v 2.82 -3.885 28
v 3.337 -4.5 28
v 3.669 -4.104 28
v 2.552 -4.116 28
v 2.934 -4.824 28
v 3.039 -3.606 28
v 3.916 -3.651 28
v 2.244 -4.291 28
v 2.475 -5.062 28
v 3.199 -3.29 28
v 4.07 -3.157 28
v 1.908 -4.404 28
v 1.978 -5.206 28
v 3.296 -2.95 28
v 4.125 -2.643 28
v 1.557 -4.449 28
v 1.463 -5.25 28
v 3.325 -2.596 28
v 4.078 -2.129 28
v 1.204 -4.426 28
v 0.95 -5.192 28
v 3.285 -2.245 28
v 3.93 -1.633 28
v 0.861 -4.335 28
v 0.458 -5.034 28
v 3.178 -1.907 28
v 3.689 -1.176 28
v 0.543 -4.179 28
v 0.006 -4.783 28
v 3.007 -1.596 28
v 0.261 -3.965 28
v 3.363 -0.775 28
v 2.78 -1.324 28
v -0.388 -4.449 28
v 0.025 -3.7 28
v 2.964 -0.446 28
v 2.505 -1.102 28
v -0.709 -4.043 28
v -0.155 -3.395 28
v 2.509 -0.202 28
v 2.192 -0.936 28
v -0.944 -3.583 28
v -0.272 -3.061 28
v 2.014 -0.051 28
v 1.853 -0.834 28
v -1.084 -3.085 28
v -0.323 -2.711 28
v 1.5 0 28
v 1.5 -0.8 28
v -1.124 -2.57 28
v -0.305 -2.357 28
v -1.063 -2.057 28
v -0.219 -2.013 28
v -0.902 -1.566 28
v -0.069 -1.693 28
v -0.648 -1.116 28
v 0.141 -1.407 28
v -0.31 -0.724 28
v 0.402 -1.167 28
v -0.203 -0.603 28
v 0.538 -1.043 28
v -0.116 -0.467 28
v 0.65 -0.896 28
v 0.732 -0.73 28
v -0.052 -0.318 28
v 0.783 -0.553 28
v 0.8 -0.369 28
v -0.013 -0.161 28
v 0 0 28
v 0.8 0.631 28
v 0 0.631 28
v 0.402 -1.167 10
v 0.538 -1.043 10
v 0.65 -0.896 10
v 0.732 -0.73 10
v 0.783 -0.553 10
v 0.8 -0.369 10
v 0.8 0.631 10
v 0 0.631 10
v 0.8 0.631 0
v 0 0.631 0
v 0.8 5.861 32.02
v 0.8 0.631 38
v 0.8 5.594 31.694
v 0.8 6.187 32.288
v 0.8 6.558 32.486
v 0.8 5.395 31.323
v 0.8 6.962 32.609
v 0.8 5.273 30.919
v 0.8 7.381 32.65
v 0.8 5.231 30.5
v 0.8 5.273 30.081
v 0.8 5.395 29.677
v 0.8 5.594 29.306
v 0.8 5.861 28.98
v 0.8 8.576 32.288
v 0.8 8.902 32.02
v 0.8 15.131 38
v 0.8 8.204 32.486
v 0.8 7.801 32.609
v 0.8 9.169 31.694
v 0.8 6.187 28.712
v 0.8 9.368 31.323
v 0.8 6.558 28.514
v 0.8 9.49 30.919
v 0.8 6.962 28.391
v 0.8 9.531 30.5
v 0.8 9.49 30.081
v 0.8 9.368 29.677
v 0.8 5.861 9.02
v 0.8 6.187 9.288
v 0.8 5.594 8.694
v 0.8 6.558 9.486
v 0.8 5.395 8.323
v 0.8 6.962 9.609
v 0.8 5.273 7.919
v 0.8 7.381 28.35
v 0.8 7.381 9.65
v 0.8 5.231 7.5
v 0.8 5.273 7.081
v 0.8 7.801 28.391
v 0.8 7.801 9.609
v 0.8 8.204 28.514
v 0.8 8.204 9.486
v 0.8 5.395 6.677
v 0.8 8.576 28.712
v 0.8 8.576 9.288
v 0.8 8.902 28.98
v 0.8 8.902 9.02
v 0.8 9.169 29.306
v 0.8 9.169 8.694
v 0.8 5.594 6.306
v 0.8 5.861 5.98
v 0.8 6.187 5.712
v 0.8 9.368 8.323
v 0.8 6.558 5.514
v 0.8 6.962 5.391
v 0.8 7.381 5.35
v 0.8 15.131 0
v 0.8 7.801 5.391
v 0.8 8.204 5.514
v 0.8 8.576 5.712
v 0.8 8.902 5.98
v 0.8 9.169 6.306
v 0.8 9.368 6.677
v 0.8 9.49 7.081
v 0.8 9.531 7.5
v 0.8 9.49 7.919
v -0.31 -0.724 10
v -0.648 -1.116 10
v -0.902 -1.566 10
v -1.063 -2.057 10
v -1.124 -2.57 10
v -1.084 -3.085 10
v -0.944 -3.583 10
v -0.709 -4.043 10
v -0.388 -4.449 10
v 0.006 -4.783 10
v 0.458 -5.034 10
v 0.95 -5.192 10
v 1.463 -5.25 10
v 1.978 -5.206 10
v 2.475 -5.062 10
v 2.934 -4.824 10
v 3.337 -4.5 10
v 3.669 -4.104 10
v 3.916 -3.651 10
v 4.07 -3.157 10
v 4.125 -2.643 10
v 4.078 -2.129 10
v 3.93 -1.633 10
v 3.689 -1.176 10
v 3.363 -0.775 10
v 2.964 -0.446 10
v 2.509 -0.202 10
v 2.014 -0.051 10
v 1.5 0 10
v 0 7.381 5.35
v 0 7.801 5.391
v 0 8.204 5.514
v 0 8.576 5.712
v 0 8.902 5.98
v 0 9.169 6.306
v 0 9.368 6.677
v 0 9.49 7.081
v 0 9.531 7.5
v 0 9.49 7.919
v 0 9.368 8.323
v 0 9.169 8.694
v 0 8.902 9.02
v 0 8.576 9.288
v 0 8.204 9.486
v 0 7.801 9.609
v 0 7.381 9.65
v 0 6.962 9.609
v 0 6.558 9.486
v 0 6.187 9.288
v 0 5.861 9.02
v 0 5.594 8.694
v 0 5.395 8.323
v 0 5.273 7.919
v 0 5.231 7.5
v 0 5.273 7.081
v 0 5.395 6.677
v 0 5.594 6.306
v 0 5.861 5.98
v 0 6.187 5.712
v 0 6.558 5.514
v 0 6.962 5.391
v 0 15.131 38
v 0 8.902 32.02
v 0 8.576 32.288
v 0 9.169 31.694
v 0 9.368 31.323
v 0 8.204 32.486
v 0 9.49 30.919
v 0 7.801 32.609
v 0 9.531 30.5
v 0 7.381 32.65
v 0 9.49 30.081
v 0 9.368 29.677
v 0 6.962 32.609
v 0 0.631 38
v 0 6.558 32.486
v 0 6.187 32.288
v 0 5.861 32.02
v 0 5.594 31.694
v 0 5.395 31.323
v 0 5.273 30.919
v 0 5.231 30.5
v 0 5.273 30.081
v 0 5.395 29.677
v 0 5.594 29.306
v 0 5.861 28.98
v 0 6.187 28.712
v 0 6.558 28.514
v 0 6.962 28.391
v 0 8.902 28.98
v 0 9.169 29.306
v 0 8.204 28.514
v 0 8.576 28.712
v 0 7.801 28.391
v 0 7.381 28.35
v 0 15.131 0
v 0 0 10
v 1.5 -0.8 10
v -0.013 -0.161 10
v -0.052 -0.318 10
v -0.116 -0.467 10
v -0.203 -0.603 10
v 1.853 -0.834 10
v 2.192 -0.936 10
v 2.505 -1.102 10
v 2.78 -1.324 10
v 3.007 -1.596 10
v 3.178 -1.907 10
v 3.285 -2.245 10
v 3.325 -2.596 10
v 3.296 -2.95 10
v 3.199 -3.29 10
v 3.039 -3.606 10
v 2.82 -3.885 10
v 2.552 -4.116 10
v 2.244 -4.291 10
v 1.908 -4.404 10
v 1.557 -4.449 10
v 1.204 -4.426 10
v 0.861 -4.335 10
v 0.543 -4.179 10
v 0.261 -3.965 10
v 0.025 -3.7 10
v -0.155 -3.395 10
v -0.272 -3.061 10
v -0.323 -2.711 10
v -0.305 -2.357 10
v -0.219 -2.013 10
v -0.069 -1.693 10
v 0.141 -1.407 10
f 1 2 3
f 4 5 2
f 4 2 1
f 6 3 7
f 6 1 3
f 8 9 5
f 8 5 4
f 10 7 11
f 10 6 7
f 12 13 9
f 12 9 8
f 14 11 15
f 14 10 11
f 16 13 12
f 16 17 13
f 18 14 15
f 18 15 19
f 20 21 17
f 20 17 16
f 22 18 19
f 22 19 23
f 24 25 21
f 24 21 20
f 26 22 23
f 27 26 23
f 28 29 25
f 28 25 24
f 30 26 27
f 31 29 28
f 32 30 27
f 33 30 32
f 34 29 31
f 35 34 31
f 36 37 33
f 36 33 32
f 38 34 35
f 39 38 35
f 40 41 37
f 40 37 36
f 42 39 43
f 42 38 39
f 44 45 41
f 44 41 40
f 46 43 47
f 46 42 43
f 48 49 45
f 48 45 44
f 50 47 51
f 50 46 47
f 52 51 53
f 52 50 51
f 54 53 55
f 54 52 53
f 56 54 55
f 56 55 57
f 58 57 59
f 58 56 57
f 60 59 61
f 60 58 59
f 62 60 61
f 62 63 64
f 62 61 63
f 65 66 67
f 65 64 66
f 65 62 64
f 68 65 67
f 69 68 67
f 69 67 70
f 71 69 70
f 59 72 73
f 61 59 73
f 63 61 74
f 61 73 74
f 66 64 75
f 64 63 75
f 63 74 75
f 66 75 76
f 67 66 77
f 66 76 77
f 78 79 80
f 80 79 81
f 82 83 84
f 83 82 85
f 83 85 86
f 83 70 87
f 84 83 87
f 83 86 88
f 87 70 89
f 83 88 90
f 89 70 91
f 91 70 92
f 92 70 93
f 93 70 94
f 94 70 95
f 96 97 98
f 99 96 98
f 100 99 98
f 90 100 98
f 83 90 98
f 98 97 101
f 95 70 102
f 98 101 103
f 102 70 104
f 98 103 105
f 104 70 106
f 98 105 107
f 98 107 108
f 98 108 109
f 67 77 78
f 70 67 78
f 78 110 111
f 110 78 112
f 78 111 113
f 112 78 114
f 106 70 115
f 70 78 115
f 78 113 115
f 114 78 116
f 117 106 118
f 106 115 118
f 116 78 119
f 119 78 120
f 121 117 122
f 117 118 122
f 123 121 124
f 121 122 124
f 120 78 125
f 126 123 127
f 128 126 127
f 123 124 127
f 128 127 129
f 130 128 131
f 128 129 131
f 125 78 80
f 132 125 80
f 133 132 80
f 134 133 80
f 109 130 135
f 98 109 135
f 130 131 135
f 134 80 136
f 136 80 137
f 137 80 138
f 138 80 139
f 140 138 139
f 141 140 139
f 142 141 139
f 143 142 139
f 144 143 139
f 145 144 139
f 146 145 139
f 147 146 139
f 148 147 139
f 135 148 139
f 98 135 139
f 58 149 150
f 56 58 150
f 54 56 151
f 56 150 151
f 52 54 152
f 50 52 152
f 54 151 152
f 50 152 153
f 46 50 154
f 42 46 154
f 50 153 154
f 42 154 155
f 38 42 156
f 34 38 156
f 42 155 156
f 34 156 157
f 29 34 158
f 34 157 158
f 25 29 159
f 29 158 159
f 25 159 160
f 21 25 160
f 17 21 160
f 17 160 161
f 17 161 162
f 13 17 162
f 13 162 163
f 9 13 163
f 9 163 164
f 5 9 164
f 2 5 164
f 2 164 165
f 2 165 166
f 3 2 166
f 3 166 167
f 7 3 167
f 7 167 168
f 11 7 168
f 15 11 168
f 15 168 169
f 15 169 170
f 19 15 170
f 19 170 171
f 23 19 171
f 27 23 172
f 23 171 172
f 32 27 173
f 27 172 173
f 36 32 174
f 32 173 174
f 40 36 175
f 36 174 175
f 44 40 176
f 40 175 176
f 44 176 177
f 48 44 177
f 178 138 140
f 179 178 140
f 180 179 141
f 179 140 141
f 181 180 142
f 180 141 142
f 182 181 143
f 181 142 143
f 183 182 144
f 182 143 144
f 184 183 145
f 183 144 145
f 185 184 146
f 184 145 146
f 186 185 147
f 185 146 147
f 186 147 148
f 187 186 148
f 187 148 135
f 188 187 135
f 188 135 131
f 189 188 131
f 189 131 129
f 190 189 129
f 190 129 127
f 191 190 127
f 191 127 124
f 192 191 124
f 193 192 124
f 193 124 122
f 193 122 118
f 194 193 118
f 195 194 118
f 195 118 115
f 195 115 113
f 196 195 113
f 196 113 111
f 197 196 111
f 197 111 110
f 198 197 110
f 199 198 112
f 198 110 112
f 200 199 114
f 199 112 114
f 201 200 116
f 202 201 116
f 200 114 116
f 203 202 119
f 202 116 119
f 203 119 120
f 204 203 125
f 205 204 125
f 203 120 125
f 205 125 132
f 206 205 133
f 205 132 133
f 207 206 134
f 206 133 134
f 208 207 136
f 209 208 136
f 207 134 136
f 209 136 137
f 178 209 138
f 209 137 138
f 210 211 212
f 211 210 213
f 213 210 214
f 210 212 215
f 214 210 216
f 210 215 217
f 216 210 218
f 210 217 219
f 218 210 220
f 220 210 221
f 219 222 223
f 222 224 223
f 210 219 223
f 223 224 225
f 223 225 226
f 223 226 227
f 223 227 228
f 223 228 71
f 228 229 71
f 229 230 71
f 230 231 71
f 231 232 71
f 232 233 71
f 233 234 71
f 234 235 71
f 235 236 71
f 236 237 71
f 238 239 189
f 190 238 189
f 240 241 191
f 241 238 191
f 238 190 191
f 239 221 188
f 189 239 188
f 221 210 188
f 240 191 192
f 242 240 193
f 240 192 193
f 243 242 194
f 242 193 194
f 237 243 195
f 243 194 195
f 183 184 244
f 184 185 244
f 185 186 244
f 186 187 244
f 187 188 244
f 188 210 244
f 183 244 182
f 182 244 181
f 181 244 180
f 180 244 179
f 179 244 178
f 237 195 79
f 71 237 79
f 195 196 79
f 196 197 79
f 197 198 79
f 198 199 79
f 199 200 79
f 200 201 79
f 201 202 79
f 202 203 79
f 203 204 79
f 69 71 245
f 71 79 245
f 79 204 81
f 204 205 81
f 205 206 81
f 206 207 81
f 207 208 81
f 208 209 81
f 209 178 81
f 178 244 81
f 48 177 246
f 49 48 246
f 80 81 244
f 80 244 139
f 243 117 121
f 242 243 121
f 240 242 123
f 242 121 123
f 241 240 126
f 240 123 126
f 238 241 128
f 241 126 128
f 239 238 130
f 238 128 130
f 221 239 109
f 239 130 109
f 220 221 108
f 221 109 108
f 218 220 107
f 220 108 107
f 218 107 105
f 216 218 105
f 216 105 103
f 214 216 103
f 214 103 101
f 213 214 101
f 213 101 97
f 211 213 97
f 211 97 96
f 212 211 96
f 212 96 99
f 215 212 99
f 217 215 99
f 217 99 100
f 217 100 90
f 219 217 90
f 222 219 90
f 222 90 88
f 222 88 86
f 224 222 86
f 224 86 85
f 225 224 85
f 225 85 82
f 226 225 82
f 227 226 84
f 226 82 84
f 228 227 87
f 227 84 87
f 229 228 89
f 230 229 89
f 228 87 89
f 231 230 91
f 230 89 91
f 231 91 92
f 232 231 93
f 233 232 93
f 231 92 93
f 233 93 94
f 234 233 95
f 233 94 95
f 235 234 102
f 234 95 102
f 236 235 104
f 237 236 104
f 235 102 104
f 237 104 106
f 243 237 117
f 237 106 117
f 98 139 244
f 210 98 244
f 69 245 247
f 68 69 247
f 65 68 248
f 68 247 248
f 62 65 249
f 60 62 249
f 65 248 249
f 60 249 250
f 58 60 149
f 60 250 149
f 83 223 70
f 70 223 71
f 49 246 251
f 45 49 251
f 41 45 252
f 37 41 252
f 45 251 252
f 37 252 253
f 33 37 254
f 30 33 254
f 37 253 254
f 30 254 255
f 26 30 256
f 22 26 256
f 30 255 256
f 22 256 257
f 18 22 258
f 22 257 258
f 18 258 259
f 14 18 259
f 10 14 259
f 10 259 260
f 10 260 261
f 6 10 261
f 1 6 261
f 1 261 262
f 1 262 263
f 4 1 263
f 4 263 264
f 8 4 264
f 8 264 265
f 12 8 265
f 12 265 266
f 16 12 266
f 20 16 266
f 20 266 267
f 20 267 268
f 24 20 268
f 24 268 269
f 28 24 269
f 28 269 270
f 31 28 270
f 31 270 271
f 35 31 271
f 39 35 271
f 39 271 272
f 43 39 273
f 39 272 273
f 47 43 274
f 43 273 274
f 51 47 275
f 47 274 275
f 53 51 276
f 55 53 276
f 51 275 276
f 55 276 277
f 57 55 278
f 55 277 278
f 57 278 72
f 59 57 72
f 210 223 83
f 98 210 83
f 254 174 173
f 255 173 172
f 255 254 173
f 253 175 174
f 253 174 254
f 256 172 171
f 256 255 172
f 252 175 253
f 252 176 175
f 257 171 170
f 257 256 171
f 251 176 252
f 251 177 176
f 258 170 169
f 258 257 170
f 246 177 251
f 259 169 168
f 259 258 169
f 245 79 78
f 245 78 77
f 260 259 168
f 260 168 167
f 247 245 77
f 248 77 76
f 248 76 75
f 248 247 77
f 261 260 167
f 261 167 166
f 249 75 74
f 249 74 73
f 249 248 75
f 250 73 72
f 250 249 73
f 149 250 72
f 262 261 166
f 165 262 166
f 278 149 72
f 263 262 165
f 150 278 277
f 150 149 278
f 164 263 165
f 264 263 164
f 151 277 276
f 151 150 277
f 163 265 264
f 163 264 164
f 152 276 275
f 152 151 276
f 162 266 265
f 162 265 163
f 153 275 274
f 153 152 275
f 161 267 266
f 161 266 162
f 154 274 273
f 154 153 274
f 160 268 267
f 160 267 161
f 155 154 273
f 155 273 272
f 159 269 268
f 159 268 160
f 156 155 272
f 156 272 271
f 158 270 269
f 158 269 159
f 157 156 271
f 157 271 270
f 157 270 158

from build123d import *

# Parameters (mm, degrees)
BOSS_EXTRUDE1_DEPTH     = 38
CUT_EXTRUDE1_REACH      = 43.037
SKETCH2_R               = 2.15
CUT_EXTRUDE4_DEPTH      = 42.036691991
CUT_EXTRUDE4_DEPTH_BACK = 42.036691991
SKETCH3_W               = 10
SKETCH3_H               = 1
SKETCH3_H_2             = 4.881241343


with BuildPart() as part:
    # Sketch1 → Boss-Extrude1 (new body)
    with BuildSketch(Plane.XY):
        with BuildLine():
            Line((0.8, -0.368758657), (0.8, 15.131241343))
            Line((0.8, 15.131241343), (0, 15.131241343))
            Line((0, 15.131241343), (0, 0))
            ThreePointArc((0, 0), (-0.08085497, -0.393919299), (-0.310344828, -0.724137931))
            ThreePointArc((-0.310344828, -0.724137931), (2.474900525, -5.062251314), (1.5, 0))
            Line((1.5, 0), (1.5, -0.8))
            ThreePointArc((1.5, -0.8), (2.079032119, -4.355707025), (0.401769912, -1.167428159))
            ThreePointArc((0.401769912, -1.167428159), (0.69492176, -0.814981745), (0.8, -0.368758657))
        make_face()
    extrude(amount=BOSS_EXTRUDE1_DEPTH)

    # Sketch2 → Cut-Extrude1 (cut, up to next)
    with BuildSketch(Plane(origin=(0.8, 0, 0), x_dir=(0, 0, -1), z_dir=(1, 0, 0)), mode=Mode.PRIVATE) as cut_extrude1_sk1:
        with Locations((-30.5, 7.381241343)):
            Circle(SKETCH2_R)
    cut_extrude1_tool1 = extrude(cut_extrude1_sk1.sketch, amount=-CUT_EXTRUDE1_REACH, mode=Mode.PRIVATE) & part.part
    # Sketch2 → Cut-Extrude1 (cut, up to next)
    with BuildSketch(Plane(origin=(0.8, 0, 0), x_dir=(0, 0, -1), z_dir=(1, 0, 0)), mode=Mode.PRIVATE) as cut_extrude1_sk2:
        with Locations((-7.5, 7.381241343)):
            Circle(SKETCH2_R)
    cut_extrude1_tool2 = extrude(cut_extrude1_sk2.sketch, amount=-CUT_EXTRUDE1_REACH, mode=Mode.PRIVATE) & part.part
    add(cut_extrude1_tool1.solids().sort_by_distance((0.8, 7.381241, 30.5))[0], mode=Mode.SUBTRACT)
    add(cut_extrude1_tool2.solids().sort_by_distance((0.8, 7.381241, 7.5))[0], mode=Mode.SUBTRACT)

    # Sketch3 → Cut-Extrude4 (cut, two sides: drawn at the far end of the back side and taken through both)
    with BuildSketch(Plane(origin=(0.8, 0, 0), x_dir=(0, 0, -1), z_dir=(1, 0, 0)).offset(-CUT_EXTRUDE4_DEPTH_BACK)):
        with Locations((-33, 0.131241343)):
            Rectangle(SKETCH3_W, SKETCH3_H)
        with Locations((-33, -2.809379328)):
            Rectangle(SKETCH3_W, SKETCH3_H_2)
        with Locations((-5, 0.131241343)):
            Rectangle(SKETCH3_W, SKETCH3_H)
        with Locations((-5, -2.809379328)):
            Rectangle(SKETCH3_W, SKETCH3_H_2)
    extrude(amount=CUT_EXTRUDE4_DEPTH + CUT_EXTRUDE4_DEPTH_BACK, mode=Mode.SUBTRACT)


solid = part.part
